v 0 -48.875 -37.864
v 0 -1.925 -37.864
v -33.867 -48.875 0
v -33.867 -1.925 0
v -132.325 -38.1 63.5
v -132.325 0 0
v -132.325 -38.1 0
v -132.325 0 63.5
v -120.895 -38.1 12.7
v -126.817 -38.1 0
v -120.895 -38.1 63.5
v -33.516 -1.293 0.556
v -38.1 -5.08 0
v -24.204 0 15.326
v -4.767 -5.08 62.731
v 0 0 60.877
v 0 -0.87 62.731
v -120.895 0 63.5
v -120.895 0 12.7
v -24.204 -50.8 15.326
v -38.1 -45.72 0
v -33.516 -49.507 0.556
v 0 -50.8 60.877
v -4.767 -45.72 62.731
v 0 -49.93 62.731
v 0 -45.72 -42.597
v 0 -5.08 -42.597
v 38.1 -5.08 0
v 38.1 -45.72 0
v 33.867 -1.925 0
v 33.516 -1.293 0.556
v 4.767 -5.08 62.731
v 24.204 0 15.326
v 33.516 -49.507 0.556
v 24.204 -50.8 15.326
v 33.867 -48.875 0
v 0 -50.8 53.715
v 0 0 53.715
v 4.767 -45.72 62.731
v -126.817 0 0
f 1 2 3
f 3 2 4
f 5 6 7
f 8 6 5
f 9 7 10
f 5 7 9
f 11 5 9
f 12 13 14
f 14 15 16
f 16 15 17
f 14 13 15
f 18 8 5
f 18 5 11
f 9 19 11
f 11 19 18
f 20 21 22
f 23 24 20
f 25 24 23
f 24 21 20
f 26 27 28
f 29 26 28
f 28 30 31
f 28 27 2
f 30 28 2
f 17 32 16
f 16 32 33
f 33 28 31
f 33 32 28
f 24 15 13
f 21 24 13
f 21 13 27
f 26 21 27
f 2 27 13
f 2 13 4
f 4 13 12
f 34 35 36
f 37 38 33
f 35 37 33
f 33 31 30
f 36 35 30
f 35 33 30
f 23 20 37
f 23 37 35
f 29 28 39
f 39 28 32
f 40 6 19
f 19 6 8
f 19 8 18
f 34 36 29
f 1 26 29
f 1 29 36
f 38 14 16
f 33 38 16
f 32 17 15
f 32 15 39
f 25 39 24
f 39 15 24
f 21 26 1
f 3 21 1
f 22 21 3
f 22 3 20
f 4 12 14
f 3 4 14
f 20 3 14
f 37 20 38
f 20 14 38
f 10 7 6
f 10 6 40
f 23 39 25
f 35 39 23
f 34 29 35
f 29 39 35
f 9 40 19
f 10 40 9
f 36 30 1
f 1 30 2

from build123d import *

# Parameters (mm, degrees)
F1_DEPTH    = 50.8
F2_T1_DEPTH = 83.2782991577
F2_T3_DEPTH = 83.2782991577
F2_T5_DEPTH = 107.325076123
F2_T7_DEPTH = 107.325076123
F3_SIZE     = 10.16
F4_W        = 11.43
F4_H        = 63.5
F5_DEPTH    = 38.1
F6_SIZE2    = 5.9221072586
F6_SIZE     = 12.7
F7_W        = 11.43
F7_H        = 63.5
F8_DEPTH    = 50.8
F9_SIZE2    = 13.9571852908
F9_SIZE     = 5.08


# Not quite as in the source:
# - a fillet or chamfer that OpenCascade refuses, or shapes differently, is made with other operations: its cross-section is extruded or revolved along the edge and cut away or added


with BuildPart() as f1:
    # F0 (on Front) → F1 (new body)
    with BuildSketch(Plane.XZ):
        Polygon((38.1, 0), (0, 71.7029050286), (-38.1, 0), (-33.8666666667, 0), (0, 53.7149782546), (33.8666666667, 0), align=None)
        Polygon((0, -42.5970949714), (38.1, 0), (33.8666666667, 0), (0, -37.864084419), (-33.8666666667, 0), (-38.1, 0), align=None)
    extrude(amount=F1_DEPTH)

    # F2: chamfer of 5.08 on 8 edges, made by hand

    # F2_s2 → F2_t1 (cut)
    with BuildSketch(Plane(origin=(-25.6427663859, 0, 28.669484385), x_dir=(0, 1, 0), z_dir=(0.6666666667, 0, -0.7453559925))):
        Polygon((-45.72, -28.3980633142), (-50.8, -23.3180633142), (-50.8, -28.3980633142), align=None)
        Polygon((-5.08, -28.3980633142), (0, -23.3180633142), (0, -28.3980633142), align=None)
    extrude(amount=F2_T1_DEPTH, mode=Mode.SUBTRACT)

    # F2_s4 → F2_t3 (cut)
    with BuildSketch(Plane(origin=(-29.8760997192, 0, -33.4024949374), x_dir=(0, 1, 0), z_dir=(0.6666666667, 0, 0.7453559925))):
        Polygon((-45.72, -28.3980633142), (-50.8, -23.3180633142), (-50.8, -28.3980633142), align=None)
        Polygon((-5.08, -28.3980633142), (0, -23.3180633142), (0, -28.3980633142), align=None)
    extrude(amount=F2_T3_DEPTH, mode=Mode.SUBTRACT)

    # F2_s6 → F2_t5 (cut)
    with BuildSketch(Plane(origin=(35.8413449406, 0, 67.4521929756), x_dir=(0, 1, 0), z_dir=(-0.4692304476, 0, -0.8830757538))):
        Polygon((-45.72, -33.6451862216), (-50.8, -28.5651862216), (-50.8, -33.6451862216), align=None)
        Polygon((-5.08, -33.6451862216), (0, -28.5651862216), (0, -33.6451862216), align=None)
    extrude(amount=F2_T5_DEPTH, mode=Mode.SUBTRACT)

    # F2_s8 → F2_t7 (cut)
    with BuildSketch(Plane(origin=(14.5188485685, 0, -27.3239795285), x_dir=(0, 1, 0), z_dir=(-0.4692304476, 0, 0.8830757538))):
        Polygon((-45.72, -33.6451862216), (-50.8, -28.5651862216), (-50.8, -33.6451862216), align=None)
        Polygon((-5.08, -33.6451862216), (0, -28.5651862216), (0, -33.6451862216), align=None)
    extrude(amount=F2_T7_DEPTH, mode=Mode.SUBTRACT)

    # F3
    f3_edges = [f1.edges().sort_by_distance(p)[0] for p in [
        (0, -25.4, 71.702905),
    ]]
    chamfer(f3_edges, length=F3_SIZE)


with BuildPart() as f5:
    # F4 (on Front) → F5 (new body)
    with BuildSketch(Plane.XZ):
        with Locations((-126.6095284371, 31.75)):
            Rectangle(F4_W, F4_H)
    extrude(amount=F5_DEPTH)

    # F6
    f6_edges = [f5.edges().sort_by_distance(p)[0] for p in [
        (-120.894528, -19.05, 0),
    ]]
    f6_side = f5.faces().sort_by_distance((-120.894528, -19.05, 31.75))[0]
    chamfer(f6_edges, length=F6_SIZE, length2=F6_SIZE2, reference=f6_side)


with BuildPart() as f8:
    # F7 (on Front) → F8 (new body)
    with BuildSketch(Plane.XZ):
        with Locations((127.6592557868, 31.75)):
            Rectangle(F7_W, F7_H)
    extrude(amount=F8_DEPTH)

    # F9
    f9_edges = [f8.edges().sort_by_distance(p)[0] for p in [
        (121.944256, -25.4, 0),
    ]]
    f9_side = f8.faces().sort_by_distance((127.659256, -25.4, 0))[0]
    chamfer(f9_edges, length=F9_SIZE, length2=F9_SIZE2, reference=f9_side)


solid = Compound([f1.part, f5.part])
